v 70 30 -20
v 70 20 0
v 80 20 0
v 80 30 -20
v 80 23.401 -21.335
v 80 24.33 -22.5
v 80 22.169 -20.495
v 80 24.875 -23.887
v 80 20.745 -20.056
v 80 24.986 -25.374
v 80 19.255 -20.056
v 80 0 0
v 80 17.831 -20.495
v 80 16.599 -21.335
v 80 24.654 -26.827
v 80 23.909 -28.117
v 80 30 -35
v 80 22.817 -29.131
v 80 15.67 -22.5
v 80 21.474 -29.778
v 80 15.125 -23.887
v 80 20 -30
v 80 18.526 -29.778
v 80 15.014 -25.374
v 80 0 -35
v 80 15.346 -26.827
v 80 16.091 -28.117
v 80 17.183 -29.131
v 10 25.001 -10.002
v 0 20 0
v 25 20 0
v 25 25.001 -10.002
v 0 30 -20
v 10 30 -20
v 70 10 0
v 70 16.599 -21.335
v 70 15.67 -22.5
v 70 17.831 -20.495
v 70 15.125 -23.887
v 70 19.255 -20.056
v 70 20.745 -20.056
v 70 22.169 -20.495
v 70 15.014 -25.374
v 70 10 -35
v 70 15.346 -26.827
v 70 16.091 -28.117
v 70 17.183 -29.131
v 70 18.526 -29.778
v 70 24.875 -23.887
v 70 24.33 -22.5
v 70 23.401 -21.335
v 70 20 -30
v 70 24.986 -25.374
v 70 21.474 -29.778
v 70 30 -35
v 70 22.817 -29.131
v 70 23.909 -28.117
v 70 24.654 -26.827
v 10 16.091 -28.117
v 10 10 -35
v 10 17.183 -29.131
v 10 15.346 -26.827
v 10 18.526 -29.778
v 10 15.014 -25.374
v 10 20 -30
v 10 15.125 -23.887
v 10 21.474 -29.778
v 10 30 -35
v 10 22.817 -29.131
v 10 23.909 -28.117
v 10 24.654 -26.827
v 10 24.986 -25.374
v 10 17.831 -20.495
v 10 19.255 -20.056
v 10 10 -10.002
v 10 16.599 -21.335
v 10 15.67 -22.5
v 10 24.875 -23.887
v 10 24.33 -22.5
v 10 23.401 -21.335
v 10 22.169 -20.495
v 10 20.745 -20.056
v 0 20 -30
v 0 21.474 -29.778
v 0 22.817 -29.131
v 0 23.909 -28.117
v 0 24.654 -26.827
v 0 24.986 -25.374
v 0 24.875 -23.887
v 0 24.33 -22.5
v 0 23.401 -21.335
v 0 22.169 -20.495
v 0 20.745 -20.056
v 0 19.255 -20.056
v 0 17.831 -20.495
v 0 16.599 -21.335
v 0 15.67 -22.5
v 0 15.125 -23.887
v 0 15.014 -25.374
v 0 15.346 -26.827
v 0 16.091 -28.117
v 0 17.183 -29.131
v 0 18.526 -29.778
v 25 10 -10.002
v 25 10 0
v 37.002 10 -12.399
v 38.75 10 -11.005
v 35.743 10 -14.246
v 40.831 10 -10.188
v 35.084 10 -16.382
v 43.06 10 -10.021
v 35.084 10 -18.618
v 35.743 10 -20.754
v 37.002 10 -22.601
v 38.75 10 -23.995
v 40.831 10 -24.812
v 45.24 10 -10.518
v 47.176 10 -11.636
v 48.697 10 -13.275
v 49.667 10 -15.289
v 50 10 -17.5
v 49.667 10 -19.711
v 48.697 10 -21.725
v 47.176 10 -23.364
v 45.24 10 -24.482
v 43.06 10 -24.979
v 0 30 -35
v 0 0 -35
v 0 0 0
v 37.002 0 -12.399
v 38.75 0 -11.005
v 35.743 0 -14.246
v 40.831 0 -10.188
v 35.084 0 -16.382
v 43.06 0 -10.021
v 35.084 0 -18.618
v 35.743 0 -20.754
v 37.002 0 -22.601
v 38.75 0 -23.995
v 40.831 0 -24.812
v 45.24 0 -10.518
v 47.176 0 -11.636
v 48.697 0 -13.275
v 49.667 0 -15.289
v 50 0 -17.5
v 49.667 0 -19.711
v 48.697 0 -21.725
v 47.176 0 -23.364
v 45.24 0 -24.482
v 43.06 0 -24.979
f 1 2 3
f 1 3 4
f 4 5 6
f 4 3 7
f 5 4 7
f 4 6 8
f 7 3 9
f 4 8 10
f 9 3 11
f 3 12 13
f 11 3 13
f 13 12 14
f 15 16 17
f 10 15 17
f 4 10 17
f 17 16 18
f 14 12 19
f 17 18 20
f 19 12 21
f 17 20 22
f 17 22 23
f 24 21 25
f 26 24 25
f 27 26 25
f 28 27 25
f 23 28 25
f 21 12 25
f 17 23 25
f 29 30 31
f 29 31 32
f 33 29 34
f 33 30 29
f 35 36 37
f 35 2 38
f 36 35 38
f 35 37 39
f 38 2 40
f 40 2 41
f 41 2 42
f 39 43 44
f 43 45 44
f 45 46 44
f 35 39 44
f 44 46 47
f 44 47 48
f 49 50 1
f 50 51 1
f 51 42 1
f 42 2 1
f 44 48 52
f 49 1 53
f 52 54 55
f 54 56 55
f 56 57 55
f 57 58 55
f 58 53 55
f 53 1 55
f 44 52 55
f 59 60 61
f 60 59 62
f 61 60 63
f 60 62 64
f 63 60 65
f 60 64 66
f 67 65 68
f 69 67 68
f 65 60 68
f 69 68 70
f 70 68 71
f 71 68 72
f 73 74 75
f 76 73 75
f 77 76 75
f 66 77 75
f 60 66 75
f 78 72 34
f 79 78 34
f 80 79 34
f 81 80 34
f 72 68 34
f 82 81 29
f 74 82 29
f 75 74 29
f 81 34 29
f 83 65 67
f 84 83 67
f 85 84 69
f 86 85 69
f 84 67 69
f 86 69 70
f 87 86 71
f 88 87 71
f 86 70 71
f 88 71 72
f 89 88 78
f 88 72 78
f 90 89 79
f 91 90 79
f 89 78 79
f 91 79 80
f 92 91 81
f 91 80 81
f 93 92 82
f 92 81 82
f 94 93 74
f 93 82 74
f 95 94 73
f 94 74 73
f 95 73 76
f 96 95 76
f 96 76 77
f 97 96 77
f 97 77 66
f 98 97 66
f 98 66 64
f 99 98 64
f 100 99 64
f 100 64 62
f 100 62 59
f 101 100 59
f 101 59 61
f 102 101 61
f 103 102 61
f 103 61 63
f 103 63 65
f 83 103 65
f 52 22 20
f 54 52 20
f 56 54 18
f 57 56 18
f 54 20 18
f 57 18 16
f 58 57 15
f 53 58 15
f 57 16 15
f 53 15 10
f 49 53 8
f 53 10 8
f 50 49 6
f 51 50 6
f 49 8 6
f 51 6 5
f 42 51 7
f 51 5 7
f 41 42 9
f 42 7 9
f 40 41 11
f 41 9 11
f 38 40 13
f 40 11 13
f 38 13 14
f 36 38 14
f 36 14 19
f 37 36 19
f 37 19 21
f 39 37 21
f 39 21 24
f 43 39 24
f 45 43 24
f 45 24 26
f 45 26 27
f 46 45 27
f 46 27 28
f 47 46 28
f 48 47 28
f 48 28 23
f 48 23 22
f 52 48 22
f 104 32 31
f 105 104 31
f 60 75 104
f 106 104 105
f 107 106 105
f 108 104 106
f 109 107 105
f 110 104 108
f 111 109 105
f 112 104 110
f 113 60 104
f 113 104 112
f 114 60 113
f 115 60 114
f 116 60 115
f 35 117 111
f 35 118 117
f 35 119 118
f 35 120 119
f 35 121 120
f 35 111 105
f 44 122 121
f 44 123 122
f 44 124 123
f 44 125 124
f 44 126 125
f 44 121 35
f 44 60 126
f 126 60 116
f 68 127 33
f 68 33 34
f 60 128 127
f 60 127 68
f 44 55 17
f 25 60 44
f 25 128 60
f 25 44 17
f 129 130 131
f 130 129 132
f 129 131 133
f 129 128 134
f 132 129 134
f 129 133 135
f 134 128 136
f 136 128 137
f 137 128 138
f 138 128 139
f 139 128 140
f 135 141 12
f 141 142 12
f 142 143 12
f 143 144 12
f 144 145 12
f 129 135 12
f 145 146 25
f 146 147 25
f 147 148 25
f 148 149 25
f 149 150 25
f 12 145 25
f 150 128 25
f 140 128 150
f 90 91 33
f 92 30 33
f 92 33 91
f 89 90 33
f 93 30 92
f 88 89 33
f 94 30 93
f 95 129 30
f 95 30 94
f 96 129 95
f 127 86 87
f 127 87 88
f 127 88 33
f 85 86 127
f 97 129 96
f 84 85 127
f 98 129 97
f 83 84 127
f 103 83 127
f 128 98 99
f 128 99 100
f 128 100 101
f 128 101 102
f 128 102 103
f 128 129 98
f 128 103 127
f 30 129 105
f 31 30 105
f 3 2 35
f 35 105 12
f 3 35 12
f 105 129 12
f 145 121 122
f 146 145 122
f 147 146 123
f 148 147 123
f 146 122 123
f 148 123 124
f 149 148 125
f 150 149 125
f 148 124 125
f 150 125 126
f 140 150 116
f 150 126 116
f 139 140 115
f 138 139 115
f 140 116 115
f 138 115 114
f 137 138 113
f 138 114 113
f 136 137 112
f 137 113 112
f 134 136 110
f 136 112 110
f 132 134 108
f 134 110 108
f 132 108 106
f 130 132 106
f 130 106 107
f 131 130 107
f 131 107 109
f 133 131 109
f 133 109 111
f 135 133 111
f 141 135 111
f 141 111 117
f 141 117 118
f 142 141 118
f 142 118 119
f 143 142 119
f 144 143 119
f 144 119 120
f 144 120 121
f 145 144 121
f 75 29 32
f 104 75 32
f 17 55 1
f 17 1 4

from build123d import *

# Parameters (mm, degrees)
SKETCH1_W           = 80
SKETCH1_H           = 35
BOSS_EXTRUDE1_DEPTH = 30
CUT_EXTRUDE1_DEPTH  = 20
CUT_EXTRUDE2_DEPTH  = 81
SKETCH4_R           = 5
CUT_EXTRUDE4_DEPTH  = 81
SKETCH5_R           = 7.5
CUT_EXTRUDE5_DEPTH  = 11


with BuildPart() as part:
    # Sketch1 → Boss-Extrude1 (new body)
    with BuildSketch(Plane(origin=(0, 0, 0), x_dir=(1, 0, 0), z_dir=(0, 1, 0))):
        with Locations((40, 17.5)):
            Rectangle(SKETCH1_W, SKETCH1_H)
    extrude(amount=BOSS_EXTRUDE1_DEPTH)

    # Sketch2 → Cut-Extrude1 (cut)
    with BuildSketch(Plane(origin=(0, 30, 0), x_dir=(1, 0, 0), z_dir=(0, 1, 0))):
        Polygon((10, 35), (10, 10.002355001), (25, 10.002355001), (25, 0), (70, 0), (70, 35), align=None)
    extrude(amount=-CUT_EXTRUDE1_DEPTH, mode=Mode.SUBTRACT)

    # Sketch3 → Cut-Extrude2 (cut, through all)
    with BuildSketch(Plane.ZY):
        Polygon((0, 30), (0, 20), (-20, 30), align=None)
    extrude(amount=-CUT_EXTRUDE2_DEPTH, mode=Mode.SUBTRACT)

    # Sketch4 → Cut-Extrude4 (cut, through all)
    with BuildSketch(Plane(origin=(80, 0, 0), x_dir=(0, 0, -1), z_dir=(1, 0, 0))):
        with Locations((25, 20)):
            Circle(SKETCH4_R)
    extrude(amount=-CUT_EXTRUDE4_DEPTH, mode=Mode.SUBTRACT)

    # Sketch5 → Cut-Extrude5 (cut, through all)
    with BuildSketch(Plane(origin=(0, 10, 0), x_dir=(1, 0, 0), z_dir=(0, 1, 0))):
        with Locations((42.5, 17.5)):
            Circle(SKETCH5_R)
    extrude(amount=-CUT_EXTRUDE5_DEPTH, mode=Mode.SUBTRACT)


solid = part.part
